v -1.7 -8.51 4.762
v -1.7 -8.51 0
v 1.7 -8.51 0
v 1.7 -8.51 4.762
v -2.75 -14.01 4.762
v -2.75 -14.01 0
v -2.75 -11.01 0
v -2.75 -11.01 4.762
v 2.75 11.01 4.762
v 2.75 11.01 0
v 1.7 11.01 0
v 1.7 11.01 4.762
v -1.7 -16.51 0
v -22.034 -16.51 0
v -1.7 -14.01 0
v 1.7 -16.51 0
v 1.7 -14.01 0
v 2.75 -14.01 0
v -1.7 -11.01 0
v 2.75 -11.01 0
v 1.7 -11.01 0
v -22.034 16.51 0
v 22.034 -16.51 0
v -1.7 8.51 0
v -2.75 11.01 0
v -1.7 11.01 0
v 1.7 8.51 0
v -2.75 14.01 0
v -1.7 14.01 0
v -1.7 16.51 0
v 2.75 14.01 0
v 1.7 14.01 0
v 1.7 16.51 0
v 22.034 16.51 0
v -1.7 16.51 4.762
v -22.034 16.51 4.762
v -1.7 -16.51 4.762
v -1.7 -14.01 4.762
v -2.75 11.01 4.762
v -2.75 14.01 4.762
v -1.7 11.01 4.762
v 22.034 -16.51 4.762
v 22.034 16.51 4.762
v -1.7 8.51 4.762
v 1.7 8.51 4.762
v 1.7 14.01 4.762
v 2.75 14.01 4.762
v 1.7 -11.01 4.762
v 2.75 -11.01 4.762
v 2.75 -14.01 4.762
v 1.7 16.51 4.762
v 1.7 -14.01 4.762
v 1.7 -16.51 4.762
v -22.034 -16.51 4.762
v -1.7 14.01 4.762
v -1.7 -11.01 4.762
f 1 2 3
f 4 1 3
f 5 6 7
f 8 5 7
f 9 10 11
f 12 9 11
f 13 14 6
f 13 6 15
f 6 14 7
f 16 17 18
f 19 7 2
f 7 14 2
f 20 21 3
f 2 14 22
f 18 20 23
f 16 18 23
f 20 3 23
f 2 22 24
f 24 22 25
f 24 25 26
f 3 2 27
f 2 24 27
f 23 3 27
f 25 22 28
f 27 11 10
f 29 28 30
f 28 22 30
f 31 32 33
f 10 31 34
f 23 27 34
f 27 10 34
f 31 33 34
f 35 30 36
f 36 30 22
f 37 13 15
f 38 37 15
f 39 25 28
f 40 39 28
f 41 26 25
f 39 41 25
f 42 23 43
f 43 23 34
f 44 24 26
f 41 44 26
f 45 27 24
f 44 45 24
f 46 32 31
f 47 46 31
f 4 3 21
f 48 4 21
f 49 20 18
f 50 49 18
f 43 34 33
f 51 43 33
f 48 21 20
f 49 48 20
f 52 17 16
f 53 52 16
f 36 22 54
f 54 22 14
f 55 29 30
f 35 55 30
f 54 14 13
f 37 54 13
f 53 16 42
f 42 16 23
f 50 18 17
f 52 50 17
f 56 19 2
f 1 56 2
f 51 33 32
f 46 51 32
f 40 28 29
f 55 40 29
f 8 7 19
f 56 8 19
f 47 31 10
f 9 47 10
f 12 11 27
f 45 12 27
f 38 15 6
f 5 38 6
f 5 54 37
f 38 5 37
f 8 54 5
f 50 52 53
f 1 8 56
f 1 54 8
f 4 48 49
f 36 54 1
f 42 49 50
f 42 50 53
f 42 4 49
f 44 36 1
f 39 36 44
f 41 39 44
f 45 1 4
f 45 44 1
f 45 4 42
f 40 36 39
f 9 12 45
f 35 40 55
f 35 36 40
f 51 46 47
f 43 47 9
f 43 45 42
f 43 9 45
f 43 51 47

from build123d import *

# Parameters (mm, degrees)
BOSS_EXTRUDE1_DEPTH = 4.7625


with BuildPart() as part:
    # Sketch1 → Boss-Extrude1 (new body)
    with BuildSketch(Plane.XY):
        Polygon((-22.0345, -16.51), (-1.7, -16.51), (-1.7, -14.01), (-2.75, -14.01), (-2.75, -11.01), (-1.7, -11.01), (-1.7, -8.51), (1.7, -8.51), (1.7, -11.01), (2.75, -11.01), (2.75, -14.01), (1.7, -14.01), (1.7, -16.51), (22.0345, -16.51), (22.0345, 16.51), (1.7, 16.51), (1.7, 14.01), (2.75, 14.01), (2.75, 11.01), (1.7, 11.01), (1.7, 8.51), (-1.7, 8.51), (-1.7, 11.01), (-2.75, 11.01), (-2.75, 14.01), (-1.7, 14.01), (-1.7, 16.51), (-22.0345, 16.51), align=None)
    extrude(amount=BOSS_EXTRUDE1_DEPTH)


solid = part.part
